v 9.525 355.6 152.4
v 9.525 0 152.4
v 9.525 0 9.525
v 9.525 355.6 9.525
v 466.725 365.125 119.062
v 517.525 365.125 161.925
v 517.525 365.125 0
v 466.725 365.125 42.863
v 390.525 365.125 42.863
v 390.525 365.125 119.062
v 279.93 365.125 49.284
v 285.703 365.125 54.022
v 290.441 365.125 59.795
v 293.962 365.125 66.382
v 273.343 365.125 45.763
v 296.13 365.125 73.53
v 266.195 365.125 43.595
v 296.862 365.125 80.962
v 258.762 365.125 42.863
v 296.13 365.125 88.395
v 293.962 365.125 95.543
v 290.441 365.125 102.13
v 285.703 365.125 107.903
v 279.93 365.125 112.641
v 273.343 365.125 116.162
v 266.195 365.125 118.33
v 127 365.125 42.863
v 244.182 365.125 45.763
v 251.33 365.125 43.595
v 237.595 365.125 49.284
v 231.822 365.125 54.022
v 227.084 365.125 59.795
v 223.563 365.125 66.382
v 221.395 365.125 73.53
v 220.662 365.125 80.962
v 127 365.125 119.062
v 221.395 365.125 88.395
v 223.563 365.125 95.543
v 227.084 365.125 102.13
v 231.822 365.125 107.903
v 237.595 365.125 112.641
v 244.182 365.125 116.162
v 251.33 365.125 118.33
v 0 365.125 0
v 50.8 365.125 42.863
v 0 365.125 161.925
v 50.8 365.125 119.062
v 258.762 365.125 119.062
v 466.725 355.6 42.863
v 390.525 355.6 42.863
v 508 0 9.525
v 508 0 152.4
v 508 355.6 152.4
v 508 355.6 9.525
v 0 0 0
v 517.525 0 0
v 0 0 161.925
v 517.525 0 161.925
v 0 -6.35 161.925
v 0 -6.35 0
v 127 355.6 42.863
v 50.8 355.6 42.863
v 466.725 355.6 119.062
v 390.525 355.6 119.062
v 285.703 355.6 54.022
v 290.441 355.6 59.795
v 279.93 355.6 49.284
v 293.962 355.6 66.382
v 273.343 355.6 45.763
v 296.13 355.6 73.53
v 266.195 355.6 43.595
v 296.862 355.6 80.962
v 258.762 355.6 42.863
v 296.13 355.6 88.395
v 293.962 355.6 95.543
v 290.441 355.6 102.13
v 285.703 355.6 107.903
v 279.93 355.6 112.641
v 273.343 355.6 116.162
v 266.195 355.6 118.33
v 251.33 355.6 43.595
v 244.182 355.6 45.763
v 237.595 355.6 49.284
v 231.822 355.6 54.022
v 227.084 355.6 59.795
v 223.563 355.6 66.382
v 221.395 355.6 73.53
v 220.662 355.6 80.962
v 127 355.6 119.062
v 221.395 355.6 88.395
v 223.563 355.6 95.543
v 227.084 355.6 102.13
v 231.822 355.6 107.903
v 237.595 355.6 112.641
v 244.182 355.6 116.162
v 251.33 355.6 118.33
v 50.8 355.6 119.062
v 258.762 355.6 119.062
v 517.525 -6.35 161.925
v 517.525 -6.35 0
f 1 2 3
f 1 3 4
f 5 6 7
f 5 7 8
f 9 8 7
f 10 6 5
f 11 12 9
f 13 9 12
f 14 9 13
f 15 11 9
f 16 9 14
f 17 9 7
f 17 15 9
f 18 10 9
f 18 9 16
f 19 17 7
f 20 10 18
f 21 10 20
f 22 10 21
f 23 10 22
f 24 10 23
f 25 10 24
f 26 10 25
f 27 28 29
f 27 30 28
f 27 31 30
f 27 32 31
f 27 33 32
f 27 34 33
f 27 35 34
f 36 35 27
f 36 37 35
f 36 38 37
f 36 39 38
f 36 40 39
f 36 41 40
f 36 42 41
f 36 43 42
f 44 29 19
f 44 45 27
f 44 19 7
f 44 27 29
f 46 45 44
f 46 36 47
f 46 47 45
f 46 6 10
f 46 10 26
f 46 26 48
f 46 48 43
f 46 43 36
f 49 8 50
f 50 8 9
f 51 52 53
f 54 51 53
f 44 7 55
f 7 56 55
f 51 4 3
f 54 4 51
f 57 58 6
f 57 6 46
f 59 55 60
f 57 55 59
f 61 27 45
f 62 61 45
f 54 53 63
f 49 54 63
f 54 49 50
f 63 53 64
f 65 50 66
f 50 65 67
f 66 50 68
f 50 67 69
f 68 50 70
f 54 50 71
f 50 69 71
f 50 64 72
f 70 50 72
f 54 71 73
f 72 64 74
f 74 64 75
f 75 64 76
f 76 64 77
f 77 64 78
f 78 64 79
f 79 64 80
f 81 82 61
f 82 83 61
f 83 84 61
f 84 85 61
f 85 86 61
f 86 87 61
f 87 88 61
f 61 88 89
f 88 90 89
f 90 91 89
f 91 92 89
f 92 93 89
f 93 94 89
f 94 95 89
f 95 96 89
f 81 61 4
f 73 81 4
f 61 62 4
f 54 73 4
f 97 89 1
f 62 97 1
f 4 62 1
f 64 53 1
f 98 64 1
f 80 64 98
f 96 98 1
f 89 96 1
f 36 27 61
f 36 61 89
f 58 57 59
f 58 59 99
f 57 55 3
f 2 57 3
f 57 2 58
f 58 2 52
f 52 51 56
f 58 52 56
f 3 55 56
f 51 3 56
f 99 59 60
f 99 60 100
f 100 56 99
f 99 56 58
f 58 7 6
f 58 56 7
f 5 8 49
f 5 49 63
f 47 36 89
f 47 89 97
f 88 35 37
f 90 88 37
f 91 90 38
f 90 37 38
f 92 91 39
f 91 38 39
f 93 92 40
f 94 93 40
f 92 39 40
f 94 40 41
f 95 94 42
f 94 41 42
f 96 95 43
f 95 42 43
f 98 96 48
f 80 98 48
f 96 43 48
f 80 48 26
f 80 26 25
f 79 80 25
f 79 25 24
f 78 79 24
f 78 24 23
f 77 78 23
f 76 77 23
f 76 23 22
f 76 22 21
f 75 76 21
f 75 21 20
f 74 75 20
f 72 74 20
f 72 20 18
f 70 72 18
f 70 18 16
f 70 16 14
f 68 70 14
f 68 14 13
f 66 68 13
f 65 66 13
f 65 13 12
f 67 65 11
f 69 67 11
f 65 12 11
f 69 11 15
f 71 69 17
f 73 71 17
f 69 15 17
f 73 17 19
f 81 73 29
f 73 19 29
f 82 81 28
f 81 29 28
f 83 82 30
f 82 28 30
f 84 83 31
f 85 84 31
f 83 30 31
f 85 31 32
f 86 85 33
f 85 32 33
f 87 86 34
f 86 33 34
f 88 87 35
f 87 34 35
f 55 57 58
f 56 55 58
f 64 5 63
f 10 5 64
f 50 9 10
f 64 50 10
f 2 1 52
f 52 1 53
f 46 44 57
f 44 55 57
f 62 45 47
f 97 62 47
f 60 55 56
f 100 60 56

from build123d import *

# Parameters (mm, degrees)
F0_W      = 508
F0_H      = 355.6
F1_DEPTH  = 9.525
F2_W      = 355.6
F2_H      = 152.4
F3_DEPTH  = 9.525
F4_W      = 355.6
F4_H      = 152.4
F5_DEPTH  = 9.525
F6_W      = 517.525
F6_H      = 355.6
F7_DEPTH  = 9.525
F8_W      = 517.525
F8_H      = 161.925
F9_DEPTH  = 9.525
F10_W     = 517.525
F10_H     = 161.925
F11_DEPTH = 6.35
F12_W     = 76.2
F12_H     = 76.2
F12_R     = 38.1
F13_DEPTH = 25.4


with BuildPart() as f1:
    # F0 (on Top) → F1 (new body)
    with BuildSketch(Plane.XY):
        with Locations((254, 177.8)):
            Rectangle(F0_W, F0_H)
    extrude(amount=F1_DEPTH)

    # F2 (on face) → F3 (join)
    with BuildSketch(Plane.YZ.offset(508)):
        with Locations((177.8, 76.2)):
            Rectangle(F2_W, F2_H)
    extrude(amount=F3_DEPTH)

    # F4 (on Right) → F5 (join)
    with BuildSketch(Plane.YZ):
        with Locations((177.8, 76.2)):
            Rectangle(F4_W, F4_H)
    extrude(amount=F5_DEPTH)

    # F6 (on face) → F7 (join)
    with BuildSketch(Plane.XY.offset(152.4)):
        with Locations((258.7625, 177.8)):
            Rectangle(F6_W, F6_H)
    extrude(amount=F7_DEPTH)

    # F8 (on face) → F9 (join)
    with BuildSketch(Plane(origin=(0, 355.6, 0), x_dir=(-1, 0, 0), z_dir=(0, 1, 0))):
        with Locations((-258.7625, 80.9625)):
            Rectangle(F8_W, F8_H)
    extrude(amount=F9_DEPTH)

    # F12 (on face) → F13 (cut)
    with BuildSketch(Plane(origin=(0, 365.125, 0), x_dir=(-1, 0, 0), z_dir=(0, 1, 0))):
        with Locations((-428.625, 80.9625)):
            Rectangle(F12_W, F12_H)
        with Locations((-88.9, 80.9625)):
            Rectangle(F12_W, F12_H)
        with Locations((-258.7625, 80.9625)):
            Circle(F12_R)
    extrude(amount=-F13_DEPTH, mode=Mode.SUBTRACT)


with BuildPart() as f11:
    # F10 (on face) → F11 (new body)
    with BuildSketch(Plane.XZ):
        with Locations((258.7625, 80.9625)):
            Rectangle(F10_W, F10_H)
    extrude(amount=F11_DEPTH)


solid = Compound([f1.part, f11.part])
